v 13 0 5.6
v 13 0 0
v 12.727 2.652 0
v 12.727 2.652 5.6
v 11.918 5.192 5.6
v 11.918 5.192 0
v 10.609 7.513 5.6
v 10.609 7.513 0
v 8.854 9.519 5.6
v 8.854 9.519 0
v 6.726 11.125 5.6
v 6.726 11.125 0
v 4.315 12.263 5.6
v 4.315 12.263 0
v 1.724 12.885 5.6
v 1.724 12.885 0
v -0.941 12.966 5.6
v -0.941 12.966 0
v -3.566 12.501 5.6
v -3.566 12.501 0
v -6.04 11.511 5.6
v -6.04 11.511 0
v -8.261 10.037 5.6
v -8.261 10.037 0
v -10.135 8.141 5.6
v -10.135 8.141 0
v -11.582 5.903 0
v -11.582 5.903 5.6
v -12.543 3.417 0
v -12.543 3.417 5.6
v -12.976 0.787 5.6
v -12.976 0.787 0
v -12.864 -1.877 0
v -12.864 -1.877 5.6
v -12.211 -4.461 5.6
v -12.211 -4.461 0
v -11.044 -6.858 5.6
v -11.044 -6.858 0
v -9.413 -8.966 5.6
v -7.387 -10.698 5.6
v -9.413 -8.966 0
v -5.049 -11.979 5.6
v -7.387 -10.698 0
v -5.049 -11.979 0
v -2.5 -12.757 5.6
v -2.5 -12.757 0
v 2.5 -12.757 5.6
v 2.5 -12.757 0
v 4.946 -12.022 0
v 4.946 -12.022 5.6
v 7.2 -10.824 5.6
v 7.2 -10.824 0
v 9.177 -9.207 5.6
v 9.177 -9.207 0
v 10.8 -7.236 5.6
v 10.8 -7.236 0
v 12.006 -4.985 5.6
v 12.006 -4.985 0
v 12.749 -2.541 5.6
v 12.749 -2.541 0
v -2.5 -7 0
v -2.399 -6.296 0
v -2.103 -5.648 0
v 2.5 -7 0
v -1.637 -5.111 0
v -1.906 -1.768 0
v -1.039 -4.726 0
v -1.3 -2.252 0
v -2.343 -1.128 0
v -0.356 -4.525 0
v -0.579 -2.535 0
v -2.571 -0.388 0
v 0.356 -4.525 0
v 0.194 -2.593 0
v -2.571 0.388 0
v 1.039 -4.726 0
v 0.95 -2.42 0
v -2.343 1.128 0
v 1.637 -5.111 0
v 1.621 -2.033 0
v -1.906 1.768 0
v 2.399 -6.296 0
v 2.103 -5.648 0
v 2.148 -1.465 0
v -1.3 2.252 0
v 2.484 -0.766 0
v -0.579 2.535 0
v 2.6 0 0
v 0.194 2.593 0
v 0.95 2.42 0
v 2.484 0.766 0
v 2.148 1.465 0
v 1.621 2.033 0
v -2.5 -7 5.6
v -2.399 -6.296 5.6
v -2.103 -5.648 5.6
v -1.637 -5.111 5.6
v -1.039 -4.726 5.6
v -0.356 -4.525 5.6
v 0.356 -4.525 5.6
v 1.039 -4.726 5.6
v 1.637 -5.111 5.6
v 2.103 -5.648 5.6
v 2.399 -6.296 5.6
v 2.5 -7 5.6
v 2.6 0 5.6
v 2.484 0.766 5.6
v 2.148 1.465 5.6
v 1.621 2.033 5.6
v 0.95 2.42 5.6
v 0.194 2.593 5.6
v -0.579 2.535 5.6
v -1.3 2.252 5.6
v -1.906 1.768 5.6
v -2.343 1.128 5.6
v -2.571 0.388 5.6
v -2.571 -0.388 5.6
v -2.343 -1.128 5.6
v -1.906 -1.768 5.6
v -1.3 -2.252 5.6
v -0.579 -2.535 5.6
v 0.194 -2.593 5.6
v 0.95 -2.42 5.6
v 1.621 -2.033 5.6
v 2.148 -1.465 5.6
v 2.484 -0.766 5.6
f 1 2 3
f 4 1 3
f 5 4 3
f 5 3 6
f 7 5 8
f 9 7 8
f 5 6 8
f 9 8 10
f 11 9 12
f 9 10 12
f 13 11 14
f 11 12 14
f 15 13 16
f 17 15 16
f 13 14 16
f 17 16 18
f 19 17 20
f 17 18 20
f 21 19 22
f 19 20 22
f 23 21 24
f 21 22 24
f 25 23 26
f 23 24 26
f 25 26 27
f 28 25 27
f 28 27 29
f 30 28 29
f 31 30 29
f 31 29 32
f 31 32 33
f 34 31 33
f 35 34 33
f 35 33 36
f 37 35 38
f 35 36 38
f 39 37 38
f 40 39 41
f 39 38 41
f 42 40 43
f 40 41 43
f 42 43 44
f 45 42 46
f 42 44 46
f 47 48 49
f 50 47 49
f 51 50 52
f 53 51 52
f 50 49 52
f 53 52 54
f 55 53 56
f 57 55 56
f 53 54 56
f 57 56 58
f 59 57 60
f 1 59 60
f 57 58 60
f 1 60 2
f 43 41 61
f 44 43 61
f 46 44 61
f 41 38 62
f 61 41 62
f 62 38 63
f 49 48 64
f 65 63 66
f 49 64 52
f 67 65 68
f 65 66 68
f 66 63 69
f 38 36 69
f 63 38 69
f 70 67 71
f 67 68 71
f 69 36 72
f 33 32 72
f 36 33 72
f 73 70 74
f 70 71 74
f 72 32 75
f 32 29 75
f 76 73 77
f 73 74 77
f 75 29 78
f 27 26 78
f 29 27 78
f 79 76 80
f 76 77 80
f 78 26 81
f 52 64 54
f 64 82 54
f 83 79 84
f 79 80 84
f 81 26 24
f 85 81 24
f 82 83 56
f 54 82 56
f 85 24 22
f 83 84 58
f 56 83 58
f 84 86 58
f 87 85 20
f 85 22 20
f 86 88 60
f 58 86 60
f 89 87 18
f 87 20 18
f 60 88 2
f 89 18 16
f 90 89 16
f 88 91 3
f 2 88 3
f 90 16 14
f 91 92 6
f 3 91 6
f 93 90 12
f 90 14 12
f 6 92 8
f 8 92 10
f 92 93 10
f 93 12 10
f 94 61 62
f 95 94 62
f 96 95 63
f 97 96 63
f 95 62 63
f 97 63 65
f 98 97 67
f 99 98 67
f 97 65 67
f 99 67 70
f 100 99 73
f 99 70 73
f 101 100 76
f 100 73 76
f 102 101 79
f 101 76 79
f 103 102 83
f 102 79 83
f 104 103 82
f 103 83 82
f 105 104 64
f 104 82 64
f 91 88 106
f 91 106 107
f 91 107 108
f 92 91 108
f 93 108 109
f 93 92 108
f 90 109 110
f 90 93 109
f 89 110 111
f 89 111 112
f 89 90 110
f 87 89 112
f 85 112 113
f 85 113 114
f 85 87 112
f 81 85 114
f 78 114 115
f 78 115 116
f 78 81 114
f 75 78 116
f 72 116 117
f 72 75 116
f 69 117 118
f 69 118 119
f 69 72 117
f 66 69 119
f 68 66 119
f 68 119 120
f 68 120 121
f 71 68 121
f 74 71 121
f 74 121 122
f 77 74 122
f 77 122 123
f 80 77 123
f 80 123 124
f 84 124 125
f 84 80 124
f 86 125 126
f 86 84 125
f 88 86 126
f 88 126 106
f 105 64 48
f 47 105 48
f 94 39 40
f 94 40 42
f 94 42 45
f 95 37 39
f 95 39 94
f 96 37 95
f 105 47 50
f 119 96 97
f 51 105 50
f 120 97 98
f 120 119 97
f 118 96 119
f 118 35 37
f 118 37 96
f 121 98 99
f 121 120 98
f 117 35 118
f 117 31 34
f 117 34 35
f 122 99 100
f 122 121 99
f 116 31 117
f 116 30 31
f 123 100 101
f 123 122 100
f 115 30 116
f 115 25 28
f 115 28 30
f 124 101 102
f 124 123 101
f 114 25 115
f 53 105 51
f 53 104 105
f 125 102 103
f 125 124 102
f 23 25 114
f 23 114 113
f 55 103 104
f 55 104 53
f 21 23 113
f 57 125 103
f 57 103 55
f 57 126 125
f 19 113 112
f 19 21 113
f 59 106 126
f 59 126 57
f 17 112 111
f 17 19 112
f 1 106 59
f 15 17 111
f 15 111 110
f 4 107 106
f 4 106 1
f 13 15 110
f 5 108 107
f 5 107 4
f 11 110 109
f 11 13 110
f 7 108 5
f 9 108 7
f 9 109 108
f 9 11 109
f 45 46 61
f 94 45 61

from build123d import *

# Parameters (mm, degrees)
SZKIC1_R                    = 2.6
DODANIE_WYCI_GNI_CIE1_DEPTH = 5.6


with BuildPart() as part:
    # Szkic1 → Dodanie-wyciągnięcie1 (new body)
    with BuildSketch(Plane.XY):
        with BuildLine():
            Line((-2.5, -12.757350822), (-2.5, -7))
            ThreePointArc((-2.5, -7), (0, -4.5), (2.5, -7))
            Line((2.5, -7), (2.5, -12.757350822))
            ThreePointArc((2.5, -12.757350822), (10.03742995, -8.261355821), (13, 0))
            ThreePointArc((13, 0), (-8.261355821, 10.03742995), (-2.5, -12.757350822))
        make_face()
        Circle(SZKIC1_R, mode=Mode.SUBTRACT)
    extrude(amount=DODANIE_WYCI_GNI_CIE1_DEPTH)


solid = part.part
